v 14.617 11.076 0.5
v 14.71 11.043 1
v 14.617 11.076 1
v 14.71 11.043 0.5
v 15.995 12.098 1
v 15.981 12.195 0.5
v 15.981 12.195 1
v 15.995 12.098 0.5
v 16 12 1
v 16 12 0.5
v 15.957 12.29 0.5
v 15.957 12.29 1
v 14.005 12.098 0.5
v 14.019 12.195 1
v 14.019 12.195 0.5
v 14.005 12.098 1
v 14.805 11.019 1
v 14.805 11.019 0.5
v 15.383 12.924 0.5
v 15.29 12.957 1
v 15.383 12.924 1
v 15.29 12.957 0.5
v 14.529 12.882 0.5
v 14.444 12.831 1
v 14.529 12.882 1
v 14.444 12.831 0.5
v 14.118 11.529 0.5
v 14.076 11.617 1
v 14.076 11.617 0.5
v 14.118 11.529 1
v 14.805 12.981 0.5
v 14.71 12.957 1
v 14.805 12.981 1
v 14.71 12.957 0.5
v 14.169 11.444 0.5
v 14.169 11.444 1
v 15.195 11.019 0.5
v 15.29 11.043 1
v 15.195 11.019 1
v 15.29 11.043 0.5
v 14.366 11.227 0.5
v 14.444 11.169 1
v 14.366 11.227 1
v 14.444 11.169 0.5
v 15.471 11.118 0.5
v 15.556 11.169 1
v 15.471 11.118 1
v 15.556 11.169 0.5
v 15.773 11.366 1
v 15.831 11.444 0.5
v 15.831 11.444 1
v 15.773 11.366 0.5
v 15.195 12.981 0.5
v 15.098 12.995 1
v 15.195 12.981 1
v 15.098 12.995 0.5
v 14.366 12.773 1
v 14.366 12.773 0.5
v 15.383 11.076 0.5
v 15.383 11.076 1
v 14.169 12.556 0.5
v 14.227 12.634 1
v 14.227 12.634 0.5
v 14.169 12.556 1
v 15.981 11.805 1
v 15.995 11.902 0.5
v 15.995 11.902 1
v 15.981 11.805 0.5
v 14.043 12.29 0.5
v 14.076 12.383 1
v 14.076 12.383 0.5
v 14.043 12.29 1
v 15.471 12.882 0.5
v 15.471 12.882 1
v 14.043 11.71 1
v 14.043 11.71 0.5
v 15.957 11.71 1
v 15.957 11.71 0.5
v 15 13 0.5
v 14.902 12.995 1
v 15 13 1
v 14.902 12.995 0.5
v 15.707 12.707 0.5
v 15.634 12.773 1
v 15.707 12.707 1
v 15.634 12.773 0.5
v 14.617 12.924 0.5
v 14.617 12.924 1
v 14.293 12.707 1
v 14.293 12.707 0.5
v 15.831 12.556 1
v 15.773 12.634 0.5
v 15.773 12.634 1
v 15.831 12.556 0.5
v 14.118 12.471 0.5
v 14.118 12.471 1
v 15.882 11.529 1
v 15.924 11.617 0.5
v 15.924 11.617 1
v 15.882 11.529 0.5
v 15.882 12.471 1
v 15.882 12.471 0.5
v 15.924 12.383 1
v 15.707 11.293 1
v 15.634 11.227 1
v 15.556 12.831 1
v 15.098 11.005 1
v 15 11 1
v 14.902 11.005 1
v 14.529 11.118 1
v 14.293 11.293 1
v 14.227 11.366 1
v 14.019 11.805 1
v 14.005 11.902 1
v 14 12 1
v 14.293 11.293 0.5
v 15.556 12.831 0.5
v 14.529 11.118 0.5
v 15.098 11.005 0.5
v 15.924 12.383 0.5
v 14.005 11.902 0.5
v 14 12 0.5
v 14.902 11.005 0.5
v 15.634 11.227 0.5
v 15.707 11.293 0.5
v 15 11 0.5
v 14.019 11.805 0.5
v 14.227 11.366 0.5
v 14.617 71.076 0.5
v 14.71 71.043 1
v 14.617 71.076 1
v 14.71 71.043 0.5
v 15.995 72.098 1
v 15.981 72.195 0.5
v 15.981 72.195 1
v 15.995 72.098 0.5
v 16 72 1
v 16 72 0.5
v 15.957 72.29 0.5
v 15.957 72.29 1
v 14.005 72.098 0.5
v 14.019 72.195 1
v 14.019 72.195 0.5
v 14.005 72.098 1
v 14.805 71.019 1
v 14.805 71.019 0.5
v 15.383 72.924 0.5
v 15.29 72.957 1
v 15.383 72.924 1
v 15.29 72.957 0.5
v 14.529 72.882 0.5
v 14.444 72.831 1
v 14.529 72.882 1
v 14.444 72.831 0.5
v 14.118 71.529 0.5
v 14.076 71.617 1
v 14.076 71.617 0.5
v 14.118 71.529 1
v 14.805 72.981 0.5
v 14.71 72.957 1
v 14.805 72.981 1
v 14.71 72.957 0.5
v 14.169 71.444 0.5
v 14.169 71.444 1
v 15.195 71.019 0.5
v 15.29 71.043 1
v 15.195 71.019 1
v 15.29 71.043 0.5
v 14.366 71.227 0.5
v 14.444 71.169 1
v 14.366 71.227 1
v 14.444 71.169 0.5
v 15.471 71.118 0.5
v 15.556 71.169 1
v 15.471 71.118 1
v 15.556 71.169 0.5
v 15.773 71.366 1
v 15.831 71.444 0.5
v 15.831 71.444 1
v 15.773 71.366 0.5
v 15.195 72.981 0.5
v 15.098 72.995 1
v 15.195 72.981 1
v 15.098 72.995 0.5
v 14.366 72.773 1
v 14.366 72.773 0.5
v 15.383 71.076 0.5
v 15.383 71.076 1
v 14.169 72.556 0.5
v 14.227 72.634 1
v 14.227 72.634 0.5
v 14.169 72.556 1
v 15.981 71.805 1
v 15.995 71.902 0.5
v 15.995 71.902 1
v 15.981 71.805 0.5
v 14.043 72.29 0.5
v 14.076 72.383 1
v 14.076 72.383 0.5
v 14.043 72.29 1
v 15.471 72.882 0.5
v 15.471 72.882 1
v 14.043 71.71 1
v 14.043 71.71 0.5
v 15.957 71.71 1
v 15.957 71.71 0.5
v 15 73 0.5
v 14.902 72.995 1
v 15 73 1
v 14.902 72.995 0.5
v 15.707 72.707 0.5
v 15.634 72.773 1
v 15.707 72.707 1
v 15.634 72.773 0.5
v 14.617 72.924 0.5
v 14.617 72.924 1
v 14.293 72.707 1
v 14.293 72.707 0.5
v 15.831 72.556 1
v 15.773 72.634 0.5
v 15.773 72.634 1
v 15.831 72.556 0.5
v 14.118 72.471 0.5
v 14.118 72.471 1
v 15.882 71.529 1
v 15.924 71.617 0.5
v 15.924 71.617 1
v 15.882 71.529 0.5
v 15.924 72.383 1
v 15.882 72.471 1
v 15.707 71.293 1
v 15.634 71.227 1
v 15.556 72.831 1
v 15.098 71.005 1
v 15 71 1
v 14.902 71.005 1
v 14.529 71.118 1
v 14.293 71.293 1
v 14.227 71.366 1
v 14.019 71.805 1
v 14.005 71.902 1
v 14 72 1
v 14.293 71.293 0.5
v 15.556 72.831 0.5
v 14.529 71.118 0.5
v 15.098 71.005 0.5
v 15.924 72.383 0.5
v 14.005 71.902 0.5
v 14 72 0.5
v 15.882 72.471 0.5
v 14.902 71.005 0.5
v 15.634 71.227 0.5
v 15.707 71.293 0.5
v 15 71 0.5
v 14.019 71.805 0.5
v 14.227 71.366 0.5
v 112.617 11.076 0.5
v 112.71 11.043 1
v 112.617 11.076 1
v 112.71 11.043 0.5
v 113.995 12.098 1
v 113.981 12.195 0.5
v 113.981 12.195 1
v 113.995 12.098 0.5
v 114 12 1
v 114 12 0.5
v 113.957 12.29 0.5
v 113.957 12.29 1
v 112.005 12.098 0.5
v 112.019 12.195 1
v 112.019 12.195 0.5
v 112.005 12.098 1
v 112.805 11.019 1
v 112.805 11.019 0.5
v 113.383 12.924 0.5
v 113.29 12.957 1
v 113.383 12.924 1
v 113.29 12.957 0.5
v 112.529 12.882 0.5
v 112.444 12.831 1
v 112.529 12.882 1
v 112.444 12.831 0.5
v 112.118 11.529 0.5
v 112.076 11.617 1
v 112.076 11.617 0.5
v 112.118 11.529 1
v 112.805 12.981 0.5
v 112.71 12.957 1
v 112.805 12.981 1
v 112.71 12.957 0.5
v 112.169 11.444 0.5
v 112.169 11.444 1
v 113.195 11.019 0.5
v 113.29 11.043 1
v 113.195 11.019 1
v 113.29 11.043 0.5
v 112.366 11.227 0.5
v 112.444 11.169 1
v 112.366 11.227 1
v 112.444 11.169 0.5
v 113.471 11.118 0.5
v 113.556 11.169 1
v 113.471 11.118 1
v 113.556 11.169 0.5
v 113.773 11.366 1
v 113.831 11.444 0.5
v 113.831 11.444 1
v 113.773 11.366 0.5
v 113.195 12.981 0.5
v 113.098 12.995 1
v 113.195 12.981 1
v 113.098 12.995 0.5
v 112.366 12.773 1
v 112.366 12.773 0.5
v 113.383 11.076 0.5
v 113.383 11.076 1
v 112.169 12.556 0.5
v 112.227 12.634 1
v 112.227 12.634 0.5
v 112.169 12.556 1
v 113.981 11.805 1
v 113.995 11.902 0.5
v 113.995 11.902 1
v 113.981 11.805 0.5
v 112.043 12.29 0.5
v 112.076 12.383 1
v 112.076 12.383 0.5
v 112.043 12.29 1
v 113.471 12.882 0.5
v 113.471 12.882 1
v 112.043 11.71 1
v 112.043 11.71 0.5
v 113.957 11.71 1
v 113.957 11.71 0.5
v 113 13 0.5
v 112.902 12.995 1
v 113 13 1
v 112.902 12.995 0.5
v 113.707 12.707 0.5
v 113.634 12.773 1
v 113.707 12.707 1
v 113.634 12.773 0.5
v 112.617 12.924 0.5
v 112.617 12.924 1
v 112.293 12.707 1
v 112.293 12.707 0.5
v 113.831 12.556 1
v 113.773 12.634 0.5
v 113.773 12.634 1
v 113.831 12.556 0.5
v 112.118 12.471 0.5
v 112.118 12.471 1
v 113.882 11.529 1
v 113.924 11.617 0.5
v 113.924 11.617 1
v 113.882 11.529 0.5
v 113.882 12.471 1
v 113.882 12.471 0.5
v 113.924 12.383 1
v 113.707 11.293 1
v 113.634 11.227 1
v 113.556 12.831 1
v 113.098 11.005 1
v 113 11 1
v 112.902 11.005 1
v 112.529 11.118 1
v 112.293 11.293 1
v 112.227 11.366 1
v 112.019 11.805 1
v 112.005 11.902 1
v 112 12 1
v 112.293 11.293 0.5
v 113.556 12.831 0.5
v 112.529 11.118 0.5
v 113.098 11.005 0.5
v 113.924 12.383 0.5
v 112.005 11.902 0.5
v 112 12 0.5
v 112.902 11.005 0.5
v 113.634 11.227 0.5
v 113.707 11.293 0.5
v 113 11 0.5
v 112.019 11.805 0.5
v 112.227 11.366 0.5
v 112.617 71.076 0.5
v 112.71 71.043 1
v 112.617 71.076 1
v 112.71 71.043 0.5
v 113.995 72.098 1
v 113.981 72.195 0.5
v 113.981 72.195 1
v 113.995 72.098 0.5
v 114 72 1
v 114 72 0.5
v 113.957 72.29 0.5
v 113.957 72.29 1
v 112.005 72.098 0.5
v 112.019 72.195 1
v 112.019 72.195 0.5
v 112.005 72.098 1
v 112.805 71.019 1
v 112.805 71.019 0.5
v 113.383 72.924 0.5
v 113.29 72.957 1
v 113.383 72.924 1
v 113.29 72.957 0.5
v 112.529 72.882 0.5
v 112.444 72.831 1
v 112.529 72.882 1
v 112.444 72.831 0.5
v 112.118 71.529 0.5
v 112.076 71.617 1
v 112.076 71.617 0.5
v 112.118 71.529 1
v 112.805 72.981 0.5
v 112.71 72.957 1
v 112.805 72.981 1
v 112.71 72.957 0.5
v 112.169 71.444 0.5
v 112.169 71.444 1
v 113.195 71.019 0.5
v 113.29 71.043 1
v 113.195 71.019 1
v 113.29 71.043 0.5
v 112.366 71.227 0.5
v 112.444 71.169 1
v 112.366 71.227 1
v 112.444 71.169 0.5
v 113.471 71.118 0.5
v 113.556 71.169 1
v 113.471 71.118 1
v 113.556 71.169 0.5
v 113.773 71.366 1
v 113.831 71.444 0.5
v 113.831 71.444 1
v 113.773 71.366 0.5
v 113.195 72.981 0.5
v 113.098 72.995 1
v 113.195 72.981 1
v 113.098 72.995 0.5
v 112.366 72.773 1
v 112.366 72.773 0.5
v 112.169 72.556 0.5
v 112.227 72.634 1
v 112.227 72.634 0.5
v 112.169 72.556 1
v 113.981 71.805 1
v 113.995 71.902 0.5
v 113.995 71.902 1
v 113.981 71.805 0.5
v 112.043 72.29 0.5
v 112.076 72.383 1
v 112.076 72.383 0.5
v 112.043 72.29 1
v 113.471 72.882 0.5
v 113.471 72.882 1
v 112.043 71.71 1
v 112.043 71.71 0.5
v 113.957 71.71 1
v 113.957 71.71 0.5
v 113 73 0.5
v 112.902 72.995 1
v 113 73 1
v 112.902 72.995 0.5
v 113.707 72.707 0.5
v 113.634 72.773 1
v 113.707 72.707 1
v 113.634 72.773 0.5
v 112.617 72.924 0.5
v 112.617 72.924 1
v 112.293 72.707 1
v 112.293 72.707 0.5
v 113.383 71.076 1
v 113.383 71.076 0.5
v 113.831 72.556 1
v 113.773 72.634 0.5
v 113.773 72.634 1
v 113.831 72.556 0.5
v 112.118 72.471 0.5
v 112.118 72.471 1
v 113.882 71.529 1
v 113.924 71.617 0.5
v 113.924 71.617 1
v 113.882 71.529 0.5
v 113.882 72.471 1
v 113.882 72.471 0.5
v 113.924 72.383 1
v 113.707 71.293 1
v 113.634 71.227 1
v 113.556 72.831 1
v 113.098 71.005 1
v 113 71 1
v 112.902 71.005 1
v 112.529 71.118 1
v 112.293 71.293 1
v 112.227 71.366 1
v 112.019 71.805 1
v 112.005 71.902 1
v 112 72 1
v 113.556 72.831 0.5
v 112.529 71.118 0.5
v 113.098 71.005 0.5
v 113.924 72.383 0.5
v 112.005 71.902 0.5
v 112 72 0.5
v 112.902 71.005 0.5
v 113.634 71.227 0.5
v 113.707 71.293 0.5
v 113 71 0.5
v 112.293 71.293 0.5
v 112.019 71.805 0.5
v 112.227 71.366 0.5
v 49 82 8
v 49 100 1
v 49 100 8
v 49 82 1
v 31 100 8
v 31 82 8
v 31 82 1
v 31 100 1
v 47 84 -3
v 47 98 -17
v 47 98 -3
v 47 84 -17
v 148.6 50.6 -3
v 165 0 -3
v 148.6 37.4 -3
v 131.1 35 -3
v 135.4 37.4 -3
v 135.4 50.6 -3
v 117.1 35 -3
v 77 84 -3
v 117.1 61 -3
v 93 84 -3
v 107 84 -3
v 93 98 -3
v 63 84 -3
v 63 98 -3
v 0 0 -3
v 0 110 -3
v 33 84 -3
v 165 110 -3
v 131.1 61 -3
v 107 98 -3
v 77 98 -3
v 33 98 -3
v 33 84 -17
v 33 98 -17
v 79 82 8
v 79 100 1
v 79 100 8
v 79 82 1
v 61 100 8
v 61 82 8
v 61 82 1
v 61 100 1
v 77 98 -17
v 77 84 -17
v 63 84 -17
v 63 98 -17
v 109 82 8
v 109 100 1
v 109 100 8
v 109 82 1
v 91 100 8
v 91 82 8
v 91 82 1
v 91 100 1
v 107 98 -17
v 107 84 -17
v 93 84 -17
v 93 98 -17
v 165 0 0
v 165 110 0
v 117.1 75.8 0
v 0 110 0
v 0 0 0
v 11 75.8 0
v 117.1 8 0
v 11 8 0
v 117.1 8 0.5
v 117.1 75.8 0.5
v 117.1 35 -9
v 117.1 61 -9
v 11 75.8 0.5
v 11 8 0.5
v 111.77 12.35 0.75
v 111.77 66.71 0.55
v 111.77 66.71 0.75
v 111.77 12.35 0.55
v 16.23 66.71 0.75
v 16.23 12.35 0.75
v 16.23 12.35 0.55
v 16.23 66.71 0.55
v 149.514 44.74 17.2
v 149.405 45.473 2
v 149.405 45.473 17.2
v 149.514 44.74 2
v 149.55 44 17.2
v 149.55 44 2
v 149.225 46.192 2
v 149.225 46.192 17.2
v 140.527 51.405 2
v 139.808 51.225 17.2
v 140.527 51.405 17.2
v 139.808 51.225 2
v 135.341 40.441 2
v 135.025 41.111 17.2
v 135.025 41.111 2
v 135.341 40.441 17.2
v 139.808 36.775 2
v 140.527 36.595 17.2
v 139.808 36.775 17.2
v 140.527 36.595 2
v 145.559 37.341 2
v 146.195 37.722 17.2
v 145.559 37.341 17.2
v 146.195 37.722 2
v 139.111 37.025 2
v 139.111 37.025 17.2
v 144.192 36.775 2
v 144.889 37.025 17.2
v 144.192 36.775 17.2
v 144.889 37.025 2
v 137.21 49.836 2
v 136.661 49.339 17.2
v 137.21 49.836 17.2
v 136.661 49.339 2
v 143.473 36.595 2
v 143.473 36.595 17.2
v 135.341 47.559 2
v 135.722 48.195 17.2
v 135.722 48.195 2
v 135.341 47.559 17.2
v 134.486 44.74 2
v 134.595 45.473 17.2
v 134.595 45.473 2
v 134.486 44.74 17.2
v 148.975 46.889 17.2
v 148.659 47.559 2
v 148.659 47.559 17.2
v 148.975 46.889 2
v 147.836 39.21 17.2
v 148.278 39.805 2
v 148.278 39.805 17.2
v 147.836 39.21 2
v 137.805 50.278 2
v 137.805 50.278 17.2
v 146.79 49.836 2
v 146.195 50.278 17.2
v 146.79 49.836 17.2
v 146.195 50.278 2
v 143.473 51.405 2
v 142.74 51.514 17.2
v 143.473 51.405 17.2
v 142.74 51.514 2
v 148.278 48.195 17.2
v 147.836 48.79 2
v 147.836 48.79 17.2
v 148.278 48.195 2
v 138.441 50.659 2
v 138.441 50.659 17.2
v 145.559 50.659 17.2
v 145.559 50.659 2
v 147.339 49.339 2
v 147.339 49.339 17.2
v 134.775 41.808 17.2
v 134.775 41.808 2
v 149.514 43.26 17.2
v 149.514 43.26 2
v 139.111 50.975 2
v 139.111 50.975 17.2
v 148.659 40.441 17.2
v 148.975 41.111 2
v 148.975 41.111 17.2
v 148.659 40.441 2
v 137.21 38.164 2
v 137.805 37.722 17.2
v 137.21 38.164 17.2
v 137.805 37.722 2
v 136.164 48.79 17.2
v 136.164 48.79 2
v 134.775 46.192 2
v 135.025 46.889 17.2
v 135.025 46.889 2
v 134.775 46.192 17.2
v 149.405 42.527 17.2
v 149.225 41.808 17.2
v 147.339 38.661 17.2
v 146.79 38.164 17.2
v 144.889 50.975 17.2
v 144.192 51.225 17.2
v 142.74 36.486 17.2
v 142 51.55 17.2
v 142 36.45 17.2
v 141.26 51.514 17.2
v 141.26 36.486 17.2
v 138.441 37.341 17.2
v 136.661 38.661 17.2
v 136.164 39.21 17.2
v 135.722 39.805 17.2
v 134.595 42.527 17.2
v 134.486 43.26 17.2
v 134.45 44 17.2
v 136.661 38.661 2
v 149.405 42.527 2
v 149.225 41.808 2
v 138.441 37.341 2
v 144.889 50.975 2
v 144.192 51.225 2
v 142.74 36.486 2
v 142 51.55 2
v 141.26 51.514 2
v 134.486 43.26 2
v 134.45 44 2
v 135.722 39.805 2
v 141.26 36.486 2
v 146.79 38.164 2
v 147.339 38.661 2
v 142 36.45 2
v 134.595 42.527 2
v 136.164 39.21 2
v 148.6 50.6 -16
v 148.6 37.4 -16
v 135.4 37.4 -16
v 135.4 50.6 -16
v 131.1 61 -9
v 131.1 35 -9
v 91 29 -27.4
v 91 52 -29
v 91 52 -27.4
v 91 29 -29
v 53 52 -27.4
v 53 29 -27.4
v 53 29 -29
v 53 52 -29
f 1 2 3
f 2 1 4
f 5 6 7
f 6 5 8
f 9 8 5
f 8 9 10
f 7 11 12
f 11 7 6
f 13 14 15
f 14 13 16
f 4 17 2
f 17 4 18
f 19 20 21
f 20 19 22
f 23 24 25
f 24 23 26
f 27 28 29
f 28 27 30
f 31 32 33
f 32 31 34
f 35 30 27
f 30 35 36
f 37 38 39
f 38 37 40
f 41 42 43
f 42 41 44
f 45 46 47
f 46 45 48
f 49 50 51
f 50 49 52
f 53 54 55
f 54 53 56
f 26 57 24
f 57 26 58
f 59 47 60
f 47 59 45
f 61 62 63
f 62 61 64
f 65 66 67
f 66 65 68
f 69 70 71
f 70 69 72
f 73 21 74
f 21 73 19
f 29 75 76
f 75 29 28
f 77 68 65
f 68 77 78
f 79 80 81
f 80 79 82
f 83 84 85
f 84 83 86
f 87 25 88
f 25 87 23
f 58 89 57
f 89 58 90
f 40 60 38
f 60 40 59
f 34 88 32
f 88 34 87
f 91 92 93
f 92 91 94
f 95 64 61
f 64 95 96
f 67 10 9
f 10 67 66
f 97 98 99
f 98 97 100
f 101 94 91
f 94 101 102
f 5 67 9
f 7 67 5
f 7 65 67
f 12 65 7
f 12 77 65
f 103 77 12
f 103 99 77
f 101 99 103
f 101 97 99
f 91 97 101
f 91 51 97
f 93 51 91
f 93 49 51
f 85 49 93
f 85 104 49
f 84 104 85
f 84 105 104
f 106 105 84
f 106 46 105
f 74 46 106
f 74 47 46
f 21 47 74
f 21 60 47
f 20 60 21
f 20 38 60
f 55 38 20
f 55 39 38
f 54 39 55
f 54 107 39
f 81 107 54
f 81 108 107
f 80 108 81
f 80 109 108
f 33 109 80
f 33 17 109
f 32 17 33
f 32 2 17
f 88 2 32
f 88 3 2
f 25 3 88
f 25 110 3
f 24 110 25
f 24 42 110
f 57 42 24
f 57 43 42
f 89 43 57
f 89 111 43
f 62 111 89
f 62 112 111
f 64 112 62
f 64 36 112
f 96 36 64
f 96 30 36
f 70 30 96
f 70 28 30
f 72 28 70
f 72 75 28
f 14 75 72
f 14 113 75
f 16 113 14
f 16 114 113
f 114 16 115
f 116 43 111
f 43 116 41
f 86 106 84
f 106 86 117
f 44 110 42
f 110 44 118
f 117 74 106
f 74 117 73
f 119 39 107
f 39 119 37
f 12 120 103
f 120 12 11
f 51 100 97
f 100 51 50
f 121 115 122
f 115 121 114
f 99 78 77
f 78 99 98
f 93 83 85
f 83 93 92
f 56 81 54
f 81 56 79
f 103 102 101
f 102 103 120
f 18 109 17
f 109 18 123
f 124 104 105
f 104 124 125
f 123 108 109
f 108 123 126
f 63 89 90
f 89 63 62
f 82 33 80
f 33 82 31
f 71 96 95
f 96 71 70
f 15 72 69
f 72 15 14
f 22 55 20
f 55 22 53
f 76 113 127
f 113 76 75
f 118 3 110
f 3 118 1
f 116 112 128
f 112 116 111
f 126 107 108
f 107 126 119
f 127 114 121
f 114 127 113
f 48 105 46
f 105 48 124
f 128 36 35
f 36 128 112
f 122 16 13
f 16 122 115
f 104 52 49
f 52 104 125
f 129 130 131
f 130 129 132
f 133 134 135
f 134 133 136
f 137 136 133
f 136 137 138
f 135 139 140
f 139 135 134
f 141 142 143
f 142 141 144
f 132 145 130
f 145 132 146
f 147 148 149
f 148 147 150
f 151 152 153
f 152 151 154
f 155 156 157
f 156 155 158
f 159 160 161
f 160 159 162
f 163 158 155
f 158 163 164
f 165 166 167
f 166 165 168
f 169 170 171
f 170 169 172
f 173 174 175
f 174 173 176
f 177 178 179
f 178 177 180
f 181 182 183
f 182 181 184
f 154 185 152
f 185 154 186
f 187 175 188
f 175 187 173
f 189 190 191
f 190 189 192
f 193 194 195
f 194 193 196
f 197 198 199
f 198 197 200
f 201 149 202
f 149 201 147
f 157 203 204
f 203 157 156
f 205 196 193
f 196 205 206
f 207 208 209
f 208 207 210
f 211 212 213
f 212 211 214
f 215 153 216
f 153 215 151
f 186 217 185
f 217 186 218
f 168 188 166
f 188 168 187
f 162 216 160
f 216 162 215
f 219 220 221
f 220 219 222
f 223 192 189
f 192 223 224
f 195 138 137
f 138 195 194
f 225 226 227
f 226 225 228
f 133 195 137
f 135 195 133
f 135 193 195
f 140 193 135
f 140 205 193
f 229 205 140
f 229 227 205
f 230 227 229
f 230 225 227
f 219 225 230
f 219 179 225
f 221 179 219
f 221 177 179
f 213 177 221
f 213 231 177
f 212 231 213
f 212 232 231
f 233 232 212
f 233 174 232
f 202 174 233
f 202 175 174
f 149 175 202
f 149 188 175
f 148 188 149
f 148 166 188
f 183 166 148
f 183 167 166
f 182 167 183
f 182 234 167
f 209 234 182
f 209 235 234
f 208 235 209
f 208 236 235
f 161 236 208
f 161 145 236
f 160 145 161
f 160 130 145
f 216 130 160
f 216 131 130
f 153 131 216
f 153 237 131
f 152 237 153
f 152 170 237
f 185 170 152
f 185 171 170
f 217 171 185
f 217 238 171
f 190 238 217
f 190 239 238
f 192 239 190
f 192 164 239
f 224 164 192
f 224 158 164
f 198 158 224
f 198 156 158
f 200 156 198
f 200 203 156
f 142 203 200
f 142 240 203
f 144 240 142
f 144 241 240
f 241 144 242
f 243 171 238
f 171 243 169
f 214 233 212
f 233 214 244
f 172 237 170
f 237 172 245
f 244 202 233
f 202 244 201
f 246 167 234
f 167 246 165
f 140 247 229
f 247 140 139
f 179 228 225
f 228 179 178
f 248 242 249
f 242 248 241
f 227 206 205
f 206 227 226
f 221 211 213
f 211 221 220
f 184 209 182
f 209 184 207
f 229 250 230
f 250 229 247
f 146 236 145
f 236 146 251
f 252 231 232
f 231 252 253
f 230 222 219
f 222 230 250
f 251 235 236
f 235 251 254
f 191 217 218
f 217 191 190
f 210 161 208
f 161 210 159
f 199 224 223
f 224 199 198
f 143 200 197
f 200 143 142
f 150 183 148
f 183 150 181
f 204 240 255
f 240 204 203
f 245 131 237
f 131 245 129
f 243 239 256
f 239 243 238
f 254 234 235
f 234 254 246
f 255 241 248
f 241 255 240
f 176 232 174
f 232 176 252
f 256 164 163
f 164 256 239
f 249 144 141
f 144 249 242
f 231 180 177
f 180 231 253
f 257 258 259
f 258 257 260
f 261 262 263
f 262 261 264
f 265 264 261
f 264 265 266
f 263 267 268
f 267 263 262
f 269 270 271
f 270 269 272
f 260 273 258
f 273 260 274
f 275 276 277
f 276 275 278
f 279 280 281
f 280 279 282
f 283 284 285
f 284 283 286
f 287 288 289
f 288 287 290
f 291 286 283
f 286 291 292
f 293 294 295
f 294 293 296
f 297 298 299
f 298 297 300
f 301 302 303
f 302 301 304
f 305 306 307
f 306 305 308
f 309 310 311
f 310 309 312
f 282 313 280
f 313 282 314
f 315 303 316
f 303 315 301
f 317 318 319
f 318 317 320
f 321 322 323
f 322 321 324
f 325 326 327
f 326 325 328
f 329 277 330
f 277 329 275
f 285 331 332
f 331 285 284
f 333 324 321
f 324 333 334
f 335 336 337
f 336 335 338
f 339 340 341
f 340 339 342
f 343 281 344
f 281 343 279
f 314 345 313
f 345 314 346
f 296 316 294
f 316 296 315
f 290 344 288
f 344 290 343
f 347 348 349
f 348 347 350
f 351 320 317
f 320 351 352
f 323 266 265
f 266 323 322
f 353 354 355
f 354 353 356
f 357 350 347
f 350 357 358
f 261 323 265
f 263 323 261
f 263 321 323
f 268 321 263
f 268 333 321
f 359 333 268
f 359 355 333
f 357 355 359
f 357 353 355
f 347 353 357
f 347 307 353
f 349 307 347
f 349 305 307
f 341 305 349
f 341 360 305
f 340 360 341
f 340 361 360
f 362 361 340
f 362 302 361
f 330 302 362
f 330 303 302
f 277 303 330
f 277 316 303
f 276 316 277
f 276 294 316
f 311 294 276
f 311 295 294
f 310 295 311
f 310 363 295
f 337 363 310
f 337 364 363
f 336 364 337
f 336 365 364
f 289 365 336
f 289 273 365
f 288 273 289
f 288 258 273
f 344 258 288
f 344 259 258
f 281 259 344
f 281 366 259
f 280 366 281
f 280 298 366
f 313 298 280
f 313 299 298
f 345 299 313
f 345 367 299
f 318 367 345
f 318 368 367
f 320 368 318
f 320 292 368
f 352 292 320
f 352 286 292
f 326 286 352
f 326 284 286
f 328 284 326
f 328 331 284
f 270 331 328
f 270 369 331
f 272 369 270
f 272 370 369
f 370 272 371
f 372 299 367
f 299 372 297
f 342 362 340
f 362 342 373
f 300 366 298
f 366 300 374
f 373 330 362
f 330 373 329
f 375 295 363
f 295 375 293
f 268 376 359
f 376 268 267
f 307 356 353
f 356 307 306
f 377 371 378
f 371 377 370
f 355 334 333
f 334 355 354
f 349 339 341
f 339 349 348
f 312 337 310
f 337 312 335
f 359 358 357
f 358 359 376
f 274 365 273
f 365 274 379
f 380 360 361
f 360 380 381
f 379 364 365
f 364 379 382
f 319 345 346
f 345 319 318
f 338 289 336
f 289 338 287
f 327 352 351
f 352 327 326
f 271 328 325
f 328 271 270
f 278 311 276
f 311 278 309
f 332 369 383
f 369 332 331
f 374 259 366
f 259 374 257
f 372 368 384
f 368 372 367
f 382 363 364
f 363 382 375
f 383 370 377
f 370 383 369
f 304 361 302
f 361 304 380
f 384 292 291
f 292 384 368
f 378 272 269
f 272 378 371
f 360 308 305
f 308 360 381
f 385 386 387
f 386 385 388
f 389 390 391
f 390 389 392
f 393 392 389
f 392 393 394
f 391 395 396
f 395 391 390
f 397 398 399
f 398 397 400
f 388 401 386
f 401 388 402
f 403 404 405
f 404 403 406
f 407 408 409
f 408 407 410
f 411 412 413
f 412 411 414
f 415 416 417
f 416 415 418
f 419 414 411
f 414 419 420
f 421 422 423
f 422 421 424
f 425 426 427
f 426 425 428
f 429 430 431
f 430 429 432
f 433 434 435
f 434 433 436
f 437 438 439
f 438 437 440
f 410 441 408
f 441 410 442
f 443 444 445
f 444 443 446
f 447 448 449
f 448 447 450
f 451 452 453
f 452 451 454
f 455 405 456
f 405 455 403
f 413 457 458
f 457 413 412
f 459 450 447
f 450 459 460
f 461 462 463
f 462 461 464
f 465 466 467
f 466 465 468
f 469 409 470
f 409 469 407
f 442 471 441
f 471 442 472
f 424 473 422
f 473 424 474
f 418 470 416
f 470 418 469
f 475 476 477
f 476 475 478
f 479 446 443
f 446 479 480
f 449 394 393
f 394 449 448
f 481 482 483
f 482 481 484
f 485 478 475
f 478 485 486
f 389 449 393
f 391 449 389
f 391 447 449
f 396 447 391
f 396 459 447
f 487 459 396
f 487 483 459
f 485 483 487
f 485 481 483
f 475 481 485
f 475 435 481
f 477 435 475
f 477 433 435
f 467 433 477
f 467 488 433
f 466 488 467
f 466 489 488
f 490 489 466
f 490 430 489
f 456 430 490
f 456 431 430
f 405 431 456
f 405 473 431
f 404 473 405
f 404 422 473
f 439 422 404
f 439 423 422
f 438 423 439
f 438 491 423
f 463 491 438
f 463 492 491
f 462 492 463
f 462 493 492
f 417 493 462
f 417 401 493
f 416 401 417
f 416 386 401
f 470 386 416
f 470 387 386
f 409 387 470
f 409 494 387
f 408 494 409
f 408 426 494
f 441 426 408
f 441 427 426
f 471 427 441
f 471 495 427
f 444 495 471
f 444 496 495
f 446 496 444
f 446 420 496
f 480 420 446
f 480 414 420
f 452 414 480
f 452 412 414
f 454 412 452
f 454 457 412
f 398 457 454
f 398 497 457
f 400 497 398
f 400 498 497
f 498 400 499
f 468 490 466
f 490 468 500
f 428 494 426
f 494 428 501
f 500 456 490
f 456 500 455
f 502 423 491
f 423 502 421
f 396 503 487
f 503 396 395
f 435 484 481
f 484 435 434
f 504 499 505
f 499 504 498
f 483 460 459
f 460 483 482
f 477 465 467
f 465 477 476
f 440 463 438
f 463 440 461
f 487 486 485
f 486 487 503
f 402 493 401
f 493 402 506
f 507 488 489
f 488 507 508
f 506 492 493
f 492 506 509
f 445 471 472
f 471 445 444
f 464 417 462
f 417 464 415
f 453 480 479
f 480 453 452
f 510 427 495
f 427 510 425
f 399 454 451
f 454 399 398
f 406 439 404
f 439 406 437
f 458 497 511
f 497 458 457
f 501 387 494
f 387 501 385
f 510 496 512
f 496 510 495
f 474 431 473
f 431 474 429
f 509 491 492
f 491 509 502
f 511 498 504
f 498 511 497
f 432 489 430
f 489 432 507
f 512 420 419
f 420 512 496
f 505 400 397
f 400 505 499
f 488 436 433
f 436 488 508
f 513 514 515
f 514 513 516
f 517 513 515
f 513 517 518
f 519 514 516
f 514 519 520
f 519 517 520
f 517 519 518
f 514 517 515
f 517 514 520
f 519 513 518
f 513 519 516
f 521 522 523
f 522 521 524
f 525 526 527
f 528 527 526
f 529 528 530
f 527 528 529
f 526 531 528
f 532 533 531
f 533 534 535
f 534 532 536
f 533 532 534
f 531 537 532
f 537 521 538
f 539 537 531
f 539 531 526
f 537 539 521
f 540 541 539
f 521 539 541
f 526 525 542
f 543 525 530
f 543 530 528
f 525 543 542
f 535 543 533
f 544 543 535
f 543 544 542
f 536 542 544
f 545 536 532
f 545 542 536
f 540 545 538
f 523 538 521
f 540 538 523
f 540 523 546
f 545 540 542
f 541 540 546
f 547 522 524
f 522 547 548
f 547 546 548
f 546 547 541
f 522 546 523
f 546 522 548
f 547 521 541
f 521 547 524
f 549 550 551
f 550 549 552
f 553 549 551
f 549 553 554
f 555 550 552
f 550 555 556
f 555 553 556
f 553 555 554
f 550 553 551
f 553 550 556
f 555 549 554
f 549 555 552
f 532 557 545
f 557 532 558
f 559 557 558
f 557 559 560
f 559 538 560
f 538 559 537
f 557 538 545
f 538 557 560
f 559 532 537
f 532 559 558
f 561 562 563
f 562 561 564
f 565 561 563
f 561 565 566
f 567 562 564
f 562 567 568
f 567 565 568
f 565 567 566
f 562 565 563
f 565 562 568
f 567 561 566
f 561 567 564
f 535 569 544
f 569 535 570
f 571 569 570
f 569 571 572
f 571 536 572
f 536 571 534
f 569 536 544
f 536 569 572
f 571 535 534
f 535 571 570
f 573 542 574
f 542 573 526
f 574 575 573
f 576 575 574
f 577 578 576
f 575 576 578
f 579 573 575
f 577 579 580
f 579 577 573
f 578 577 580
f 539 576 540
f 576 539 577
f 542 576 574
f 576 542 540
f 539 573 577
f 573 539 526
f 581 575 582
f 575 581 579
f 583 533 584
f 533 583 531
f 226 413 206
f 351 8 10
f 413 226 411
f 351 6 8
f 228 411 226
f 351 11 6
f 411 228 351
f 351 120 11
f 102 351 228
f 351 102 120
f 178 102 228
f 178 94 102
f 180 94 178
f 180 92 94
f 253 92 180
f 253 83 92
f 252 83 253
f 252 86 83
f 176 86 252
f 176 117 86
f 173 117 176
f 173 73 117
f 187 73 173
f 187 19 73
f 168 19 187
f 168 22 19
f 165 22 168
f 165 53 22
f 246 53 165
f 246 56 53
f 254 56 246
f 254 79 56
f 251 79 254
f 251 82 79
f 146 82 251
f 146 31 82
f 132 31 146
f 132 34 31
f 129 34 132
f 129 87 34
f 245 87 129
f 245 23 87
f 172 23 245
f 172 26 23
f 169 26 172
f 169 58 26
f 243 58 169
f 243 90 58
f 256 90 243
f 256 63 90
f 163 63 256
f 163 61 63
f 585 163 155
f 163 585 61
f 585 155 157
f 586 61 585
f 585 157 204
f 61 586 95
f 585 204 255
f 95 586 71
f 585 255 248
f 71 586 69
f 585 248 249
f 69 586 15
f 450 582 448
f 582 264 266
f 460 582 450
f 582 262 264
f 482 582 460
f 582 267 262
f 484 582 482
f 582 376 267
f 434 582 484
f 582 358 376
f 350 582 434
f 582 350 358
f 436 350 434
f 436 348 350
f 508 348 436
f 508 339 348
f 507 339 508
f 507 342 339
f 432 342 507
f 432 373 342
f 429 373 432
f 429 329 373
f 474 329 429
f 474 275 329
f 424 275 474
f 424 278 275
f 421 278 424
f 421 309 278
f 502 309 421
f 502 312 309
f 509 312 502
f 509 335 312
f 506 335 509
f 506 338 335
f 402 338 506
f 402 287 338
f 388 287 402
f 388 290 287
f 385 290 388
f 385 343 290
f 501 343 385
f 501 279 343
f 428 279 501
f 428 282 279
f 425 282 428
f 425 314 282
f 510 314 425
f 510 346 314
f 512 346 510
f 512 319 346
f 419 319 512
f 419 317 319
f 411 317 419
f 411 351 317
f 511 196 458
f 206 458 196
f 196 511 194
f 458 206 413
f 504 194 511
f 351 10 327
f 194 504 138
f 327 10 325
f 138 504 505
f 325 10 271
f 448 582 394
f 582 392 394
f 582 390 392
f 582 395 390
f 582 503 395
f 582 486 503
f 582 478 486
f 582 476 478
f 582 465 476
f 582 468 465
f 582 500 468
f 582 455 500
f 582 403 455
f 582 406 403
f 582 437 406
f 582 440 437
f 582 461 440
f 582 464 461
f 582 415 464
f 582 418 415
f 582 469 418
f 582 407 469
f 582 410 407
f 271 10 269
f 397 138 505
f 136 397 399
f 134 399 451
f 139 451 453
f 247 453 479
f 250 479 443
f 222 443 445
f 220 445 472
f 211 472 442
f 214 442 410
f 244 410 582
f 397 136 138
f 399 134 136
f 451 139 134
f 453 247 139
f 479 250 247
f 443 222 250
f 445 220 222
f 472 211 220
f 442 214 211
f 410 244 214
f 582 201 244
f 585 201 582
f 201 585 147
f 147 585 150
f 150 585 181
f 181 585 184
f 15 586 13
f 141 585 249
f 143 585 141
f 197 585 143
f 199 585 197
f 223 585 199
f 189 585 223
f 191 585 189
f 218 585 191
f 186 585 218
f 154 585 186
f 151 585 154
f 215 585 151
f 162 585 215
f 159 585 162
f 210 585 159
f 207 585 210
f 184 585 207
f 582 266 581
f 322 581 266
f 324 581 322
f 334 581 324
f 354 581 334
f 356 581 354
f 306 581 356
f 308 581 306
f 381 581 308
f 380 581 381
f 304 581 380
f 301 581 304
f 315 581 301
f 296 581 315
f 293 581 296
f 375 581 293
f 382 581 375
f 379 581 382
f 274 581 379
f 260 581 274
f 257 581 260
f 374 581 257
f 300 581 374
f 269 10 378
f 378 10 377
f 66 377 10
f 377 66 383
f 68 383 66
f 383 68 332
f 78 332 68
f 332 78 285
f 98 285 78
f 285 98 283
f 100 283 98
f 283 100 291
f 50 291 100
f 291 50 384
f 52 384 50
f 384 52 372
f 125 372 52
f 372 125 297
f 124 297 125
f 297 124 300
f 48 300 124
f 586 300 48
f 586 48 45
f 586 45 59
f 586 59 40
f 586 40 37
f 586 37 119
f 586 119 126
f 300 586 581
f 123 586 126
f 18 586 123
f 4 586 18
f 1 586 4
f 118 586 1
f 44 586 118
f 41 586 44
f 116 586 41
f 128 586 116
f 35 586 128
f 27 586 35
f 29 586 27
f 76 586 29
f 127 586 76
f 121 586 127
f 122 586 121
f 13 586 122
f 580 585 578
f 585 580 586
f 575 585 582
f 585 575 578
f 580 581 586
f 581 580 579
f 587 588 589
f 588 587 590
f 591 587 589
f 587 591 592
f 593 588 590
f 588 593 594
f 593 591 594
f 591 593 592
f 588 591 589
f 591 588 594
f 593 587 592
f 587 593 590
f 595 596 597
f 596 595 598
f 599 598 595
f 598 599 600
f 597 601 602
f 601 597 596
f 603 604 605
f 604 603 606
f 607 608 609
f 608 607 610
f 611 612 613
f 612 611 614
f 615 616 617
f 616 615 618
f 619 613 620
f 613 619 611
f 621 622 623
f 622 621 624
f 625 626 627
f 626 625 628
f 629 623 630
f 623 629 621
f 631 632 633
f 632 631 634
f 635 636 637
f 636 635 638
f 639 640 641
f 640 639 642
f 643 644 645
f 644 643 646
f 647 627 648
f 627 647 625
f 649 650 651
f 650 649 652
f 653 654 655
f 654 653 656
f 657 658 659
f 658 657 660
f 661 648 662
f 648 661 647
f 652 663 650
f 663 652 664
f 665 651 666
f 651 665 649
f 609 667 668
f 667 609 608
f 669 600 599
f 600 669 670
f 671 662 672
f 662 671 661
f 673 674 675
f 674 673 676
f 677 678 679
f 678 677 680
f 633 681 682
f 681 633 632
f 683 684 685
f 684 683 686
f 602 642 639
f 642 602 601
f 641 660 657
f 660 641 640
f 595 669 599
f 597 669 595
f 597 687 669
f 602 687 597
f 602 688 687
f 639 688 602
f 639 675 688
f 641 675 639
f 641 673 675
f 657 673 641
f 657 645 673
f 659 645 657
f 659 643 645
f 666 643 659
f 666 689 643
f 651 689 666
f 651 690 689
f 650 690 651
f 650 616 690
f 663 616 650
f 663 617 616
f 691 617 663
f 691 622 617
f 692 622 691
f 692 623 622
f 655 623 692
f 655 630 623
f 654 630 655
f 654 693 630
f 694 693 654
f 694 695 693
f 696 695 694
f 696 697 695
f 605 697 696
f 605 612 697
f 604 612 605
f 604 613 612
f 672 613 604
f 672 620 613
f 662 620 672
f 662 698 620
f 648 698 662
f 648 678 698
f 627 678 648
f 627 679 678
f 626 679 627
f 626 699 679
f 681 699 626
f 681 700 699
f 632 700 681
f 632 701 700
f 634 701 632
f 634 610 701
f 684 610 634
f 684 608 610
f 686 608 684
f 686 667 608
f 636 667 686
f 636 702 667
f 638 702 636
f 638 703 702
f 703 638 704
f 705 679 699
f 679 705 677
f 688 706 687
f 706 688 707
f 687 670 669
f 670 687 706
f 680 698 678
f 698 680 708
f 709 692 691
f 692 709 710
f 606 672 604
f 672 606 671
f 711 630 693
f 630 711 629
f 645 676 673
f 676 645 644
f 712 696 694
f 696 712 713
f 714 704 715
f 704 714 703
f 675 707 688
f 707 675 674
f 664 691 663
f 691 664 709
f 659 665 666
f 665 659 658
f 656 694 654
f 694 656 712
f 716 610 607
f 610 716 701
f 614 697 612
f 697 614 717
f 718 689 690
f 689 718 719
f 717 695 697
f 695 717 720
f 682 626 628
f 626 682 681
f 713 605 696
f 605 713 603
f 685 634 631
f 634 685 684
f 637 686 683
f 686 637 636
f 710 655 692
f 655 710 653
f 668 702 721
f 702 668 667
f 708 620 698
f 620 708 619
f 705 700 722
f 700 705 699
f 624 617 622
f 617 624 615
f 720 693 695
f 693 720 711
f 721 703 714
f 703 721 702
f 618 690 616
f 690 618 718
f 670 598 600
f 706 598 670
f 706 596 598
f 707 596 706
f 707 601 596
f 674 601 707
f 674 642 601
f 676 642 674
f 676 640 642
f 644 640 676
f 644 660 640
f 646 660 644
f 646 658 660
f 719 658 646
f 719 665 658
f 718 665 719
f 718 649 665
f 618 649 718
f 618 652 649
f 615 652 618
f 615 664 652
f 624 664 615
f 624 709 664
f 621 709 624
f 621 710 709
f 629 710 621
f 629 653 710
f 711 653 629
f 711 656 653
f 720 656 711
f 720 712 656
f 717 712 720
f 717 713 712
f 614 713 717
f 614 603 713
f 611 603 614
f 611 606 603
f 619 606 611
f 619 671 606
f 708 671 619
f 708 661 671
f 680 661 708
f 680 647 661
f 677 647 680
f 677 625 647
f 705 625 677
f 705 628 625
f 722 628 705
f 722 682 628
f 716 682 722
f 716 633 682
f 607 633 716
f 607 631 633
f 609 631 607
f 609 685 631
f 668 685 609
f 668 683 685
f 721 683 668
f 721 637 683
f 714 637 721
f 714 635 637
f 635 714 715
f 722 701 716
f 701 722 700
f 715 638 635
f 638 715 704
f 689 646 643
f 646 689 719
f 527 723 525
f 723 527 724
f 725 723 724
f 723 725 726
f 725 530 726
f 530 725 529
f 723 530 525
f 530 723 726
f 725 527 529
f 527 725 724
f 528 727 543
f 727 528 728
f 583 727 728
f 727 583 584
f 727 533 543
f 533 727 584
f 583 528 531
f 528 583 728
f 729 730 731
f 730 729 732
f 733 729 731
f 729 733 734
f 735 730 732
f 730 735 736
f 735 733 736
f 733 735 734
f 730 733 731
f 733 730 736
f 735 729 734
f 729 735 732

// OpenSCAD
// Spotify Desk Thing - Phase 6 envelope study - REFERENCE ONLY, NOT A PRINTABLE CASE
// Units: mm. No drill holes, wall design, switch retention or display recess is certified.
// trial=0 compact 150x105; trial=1 roomy 165x110 (leading candidate).
trial=1;
$fn=64;
panel_w=trial==0 ? 150 : 165;
panel_h=trial==0 ? 105 : 110;
panel_t=3; // placeholder only, not verified
screen_xy=trial==0 ? [8,7] : [11,8];
key_centres=trial==0 ? [39,69,99] : [40,70,100];
key_y=trial==0 ? 86 : 91;
knob_xy=trial==0 ? [131,41] : [142,44];
screen_size=[106.1,67.8]; // exact touch display outer envelope nominal
active_offset=[5.23,4.35]; active_size=[95.54,54.36];
knob_d=15.1; knob_total_h=15.2; // KZ0087 listed dimensions
encoder_body=[13.2,13.2,13.2]; // Z depth placeholder, not a verified package dimension
mx_cap=[18,18,7]; // z visible height illustrative
mx_switch=[14,14,14]; // plate opening reference; z depth illustrative
aw_board=[38,23,1.6]; // AW9523B x/y manufacturer; z thickness illustrative
// XY top-left origin in drawings; z=0 front-face plane, negative behind face.
// Purple markers are nominal projected rear-board mounting centres, NOT drill holes.
module study() {
 color([.9,.94,.97,.22]) translate([0,0,-panel_t]) cube([panel_w,panel_h,panel_t]);
 color([.12,.31,.43,.78]) translate([screen_xy[0],screen_xy[1],-.5]) cube([screen_size[0],screen_size[1],1]);
 color([.03,.52,.62,.83]) translate([screen_xy[0]+active_offset[0],screen_xy[1]+active_offset[1],.55]) cube([active_size[0],active_size[1],.2]);
 for (xx=[4,102],yy=[4,64])
   color([.65,.38,.75,.9]) translate([screen_xy[0]+xx,screen_xy[1]+yy,-2]) cylinder(d=2,h=3);
 for (i=[0:2]) {
  color([.18,.20,.27]) translate([key_centres[i]-9,key_y-9,1]) cube(mx_cap);
  color([.13,.49,.57,.53]) translate([key_centres[i]-7,key_y-7,-17]) cube(mx_switch);
 }
 color([.21,.25,.29]) translate([knob_xy[0],knob_xy[1],2]) cylinder(d=knob_d,h=knob_total_h);
 color([.65,.65,.71,.52]) translate([knob_xy[0]-6.6,knob_xy[1]-6.6,-16]) cube(encoder_body);
 // Placeholder right-side I2C cable corridor: 14 mm is an ASSUMPTION.
 color([1,.54,.12,.27]) translate([screen_xy[0]+106.1,screen_xy[1]+27,-9]) cube([14,26,9]);
 // AW expansion board is on DIFFERENT mounting depth; no standoff spec.
 color([.65,.33,.68,.5]) translate([screen_xy[0]+42,screen_xy[1]+21,-29]) cube(aw_board);
}
study();
